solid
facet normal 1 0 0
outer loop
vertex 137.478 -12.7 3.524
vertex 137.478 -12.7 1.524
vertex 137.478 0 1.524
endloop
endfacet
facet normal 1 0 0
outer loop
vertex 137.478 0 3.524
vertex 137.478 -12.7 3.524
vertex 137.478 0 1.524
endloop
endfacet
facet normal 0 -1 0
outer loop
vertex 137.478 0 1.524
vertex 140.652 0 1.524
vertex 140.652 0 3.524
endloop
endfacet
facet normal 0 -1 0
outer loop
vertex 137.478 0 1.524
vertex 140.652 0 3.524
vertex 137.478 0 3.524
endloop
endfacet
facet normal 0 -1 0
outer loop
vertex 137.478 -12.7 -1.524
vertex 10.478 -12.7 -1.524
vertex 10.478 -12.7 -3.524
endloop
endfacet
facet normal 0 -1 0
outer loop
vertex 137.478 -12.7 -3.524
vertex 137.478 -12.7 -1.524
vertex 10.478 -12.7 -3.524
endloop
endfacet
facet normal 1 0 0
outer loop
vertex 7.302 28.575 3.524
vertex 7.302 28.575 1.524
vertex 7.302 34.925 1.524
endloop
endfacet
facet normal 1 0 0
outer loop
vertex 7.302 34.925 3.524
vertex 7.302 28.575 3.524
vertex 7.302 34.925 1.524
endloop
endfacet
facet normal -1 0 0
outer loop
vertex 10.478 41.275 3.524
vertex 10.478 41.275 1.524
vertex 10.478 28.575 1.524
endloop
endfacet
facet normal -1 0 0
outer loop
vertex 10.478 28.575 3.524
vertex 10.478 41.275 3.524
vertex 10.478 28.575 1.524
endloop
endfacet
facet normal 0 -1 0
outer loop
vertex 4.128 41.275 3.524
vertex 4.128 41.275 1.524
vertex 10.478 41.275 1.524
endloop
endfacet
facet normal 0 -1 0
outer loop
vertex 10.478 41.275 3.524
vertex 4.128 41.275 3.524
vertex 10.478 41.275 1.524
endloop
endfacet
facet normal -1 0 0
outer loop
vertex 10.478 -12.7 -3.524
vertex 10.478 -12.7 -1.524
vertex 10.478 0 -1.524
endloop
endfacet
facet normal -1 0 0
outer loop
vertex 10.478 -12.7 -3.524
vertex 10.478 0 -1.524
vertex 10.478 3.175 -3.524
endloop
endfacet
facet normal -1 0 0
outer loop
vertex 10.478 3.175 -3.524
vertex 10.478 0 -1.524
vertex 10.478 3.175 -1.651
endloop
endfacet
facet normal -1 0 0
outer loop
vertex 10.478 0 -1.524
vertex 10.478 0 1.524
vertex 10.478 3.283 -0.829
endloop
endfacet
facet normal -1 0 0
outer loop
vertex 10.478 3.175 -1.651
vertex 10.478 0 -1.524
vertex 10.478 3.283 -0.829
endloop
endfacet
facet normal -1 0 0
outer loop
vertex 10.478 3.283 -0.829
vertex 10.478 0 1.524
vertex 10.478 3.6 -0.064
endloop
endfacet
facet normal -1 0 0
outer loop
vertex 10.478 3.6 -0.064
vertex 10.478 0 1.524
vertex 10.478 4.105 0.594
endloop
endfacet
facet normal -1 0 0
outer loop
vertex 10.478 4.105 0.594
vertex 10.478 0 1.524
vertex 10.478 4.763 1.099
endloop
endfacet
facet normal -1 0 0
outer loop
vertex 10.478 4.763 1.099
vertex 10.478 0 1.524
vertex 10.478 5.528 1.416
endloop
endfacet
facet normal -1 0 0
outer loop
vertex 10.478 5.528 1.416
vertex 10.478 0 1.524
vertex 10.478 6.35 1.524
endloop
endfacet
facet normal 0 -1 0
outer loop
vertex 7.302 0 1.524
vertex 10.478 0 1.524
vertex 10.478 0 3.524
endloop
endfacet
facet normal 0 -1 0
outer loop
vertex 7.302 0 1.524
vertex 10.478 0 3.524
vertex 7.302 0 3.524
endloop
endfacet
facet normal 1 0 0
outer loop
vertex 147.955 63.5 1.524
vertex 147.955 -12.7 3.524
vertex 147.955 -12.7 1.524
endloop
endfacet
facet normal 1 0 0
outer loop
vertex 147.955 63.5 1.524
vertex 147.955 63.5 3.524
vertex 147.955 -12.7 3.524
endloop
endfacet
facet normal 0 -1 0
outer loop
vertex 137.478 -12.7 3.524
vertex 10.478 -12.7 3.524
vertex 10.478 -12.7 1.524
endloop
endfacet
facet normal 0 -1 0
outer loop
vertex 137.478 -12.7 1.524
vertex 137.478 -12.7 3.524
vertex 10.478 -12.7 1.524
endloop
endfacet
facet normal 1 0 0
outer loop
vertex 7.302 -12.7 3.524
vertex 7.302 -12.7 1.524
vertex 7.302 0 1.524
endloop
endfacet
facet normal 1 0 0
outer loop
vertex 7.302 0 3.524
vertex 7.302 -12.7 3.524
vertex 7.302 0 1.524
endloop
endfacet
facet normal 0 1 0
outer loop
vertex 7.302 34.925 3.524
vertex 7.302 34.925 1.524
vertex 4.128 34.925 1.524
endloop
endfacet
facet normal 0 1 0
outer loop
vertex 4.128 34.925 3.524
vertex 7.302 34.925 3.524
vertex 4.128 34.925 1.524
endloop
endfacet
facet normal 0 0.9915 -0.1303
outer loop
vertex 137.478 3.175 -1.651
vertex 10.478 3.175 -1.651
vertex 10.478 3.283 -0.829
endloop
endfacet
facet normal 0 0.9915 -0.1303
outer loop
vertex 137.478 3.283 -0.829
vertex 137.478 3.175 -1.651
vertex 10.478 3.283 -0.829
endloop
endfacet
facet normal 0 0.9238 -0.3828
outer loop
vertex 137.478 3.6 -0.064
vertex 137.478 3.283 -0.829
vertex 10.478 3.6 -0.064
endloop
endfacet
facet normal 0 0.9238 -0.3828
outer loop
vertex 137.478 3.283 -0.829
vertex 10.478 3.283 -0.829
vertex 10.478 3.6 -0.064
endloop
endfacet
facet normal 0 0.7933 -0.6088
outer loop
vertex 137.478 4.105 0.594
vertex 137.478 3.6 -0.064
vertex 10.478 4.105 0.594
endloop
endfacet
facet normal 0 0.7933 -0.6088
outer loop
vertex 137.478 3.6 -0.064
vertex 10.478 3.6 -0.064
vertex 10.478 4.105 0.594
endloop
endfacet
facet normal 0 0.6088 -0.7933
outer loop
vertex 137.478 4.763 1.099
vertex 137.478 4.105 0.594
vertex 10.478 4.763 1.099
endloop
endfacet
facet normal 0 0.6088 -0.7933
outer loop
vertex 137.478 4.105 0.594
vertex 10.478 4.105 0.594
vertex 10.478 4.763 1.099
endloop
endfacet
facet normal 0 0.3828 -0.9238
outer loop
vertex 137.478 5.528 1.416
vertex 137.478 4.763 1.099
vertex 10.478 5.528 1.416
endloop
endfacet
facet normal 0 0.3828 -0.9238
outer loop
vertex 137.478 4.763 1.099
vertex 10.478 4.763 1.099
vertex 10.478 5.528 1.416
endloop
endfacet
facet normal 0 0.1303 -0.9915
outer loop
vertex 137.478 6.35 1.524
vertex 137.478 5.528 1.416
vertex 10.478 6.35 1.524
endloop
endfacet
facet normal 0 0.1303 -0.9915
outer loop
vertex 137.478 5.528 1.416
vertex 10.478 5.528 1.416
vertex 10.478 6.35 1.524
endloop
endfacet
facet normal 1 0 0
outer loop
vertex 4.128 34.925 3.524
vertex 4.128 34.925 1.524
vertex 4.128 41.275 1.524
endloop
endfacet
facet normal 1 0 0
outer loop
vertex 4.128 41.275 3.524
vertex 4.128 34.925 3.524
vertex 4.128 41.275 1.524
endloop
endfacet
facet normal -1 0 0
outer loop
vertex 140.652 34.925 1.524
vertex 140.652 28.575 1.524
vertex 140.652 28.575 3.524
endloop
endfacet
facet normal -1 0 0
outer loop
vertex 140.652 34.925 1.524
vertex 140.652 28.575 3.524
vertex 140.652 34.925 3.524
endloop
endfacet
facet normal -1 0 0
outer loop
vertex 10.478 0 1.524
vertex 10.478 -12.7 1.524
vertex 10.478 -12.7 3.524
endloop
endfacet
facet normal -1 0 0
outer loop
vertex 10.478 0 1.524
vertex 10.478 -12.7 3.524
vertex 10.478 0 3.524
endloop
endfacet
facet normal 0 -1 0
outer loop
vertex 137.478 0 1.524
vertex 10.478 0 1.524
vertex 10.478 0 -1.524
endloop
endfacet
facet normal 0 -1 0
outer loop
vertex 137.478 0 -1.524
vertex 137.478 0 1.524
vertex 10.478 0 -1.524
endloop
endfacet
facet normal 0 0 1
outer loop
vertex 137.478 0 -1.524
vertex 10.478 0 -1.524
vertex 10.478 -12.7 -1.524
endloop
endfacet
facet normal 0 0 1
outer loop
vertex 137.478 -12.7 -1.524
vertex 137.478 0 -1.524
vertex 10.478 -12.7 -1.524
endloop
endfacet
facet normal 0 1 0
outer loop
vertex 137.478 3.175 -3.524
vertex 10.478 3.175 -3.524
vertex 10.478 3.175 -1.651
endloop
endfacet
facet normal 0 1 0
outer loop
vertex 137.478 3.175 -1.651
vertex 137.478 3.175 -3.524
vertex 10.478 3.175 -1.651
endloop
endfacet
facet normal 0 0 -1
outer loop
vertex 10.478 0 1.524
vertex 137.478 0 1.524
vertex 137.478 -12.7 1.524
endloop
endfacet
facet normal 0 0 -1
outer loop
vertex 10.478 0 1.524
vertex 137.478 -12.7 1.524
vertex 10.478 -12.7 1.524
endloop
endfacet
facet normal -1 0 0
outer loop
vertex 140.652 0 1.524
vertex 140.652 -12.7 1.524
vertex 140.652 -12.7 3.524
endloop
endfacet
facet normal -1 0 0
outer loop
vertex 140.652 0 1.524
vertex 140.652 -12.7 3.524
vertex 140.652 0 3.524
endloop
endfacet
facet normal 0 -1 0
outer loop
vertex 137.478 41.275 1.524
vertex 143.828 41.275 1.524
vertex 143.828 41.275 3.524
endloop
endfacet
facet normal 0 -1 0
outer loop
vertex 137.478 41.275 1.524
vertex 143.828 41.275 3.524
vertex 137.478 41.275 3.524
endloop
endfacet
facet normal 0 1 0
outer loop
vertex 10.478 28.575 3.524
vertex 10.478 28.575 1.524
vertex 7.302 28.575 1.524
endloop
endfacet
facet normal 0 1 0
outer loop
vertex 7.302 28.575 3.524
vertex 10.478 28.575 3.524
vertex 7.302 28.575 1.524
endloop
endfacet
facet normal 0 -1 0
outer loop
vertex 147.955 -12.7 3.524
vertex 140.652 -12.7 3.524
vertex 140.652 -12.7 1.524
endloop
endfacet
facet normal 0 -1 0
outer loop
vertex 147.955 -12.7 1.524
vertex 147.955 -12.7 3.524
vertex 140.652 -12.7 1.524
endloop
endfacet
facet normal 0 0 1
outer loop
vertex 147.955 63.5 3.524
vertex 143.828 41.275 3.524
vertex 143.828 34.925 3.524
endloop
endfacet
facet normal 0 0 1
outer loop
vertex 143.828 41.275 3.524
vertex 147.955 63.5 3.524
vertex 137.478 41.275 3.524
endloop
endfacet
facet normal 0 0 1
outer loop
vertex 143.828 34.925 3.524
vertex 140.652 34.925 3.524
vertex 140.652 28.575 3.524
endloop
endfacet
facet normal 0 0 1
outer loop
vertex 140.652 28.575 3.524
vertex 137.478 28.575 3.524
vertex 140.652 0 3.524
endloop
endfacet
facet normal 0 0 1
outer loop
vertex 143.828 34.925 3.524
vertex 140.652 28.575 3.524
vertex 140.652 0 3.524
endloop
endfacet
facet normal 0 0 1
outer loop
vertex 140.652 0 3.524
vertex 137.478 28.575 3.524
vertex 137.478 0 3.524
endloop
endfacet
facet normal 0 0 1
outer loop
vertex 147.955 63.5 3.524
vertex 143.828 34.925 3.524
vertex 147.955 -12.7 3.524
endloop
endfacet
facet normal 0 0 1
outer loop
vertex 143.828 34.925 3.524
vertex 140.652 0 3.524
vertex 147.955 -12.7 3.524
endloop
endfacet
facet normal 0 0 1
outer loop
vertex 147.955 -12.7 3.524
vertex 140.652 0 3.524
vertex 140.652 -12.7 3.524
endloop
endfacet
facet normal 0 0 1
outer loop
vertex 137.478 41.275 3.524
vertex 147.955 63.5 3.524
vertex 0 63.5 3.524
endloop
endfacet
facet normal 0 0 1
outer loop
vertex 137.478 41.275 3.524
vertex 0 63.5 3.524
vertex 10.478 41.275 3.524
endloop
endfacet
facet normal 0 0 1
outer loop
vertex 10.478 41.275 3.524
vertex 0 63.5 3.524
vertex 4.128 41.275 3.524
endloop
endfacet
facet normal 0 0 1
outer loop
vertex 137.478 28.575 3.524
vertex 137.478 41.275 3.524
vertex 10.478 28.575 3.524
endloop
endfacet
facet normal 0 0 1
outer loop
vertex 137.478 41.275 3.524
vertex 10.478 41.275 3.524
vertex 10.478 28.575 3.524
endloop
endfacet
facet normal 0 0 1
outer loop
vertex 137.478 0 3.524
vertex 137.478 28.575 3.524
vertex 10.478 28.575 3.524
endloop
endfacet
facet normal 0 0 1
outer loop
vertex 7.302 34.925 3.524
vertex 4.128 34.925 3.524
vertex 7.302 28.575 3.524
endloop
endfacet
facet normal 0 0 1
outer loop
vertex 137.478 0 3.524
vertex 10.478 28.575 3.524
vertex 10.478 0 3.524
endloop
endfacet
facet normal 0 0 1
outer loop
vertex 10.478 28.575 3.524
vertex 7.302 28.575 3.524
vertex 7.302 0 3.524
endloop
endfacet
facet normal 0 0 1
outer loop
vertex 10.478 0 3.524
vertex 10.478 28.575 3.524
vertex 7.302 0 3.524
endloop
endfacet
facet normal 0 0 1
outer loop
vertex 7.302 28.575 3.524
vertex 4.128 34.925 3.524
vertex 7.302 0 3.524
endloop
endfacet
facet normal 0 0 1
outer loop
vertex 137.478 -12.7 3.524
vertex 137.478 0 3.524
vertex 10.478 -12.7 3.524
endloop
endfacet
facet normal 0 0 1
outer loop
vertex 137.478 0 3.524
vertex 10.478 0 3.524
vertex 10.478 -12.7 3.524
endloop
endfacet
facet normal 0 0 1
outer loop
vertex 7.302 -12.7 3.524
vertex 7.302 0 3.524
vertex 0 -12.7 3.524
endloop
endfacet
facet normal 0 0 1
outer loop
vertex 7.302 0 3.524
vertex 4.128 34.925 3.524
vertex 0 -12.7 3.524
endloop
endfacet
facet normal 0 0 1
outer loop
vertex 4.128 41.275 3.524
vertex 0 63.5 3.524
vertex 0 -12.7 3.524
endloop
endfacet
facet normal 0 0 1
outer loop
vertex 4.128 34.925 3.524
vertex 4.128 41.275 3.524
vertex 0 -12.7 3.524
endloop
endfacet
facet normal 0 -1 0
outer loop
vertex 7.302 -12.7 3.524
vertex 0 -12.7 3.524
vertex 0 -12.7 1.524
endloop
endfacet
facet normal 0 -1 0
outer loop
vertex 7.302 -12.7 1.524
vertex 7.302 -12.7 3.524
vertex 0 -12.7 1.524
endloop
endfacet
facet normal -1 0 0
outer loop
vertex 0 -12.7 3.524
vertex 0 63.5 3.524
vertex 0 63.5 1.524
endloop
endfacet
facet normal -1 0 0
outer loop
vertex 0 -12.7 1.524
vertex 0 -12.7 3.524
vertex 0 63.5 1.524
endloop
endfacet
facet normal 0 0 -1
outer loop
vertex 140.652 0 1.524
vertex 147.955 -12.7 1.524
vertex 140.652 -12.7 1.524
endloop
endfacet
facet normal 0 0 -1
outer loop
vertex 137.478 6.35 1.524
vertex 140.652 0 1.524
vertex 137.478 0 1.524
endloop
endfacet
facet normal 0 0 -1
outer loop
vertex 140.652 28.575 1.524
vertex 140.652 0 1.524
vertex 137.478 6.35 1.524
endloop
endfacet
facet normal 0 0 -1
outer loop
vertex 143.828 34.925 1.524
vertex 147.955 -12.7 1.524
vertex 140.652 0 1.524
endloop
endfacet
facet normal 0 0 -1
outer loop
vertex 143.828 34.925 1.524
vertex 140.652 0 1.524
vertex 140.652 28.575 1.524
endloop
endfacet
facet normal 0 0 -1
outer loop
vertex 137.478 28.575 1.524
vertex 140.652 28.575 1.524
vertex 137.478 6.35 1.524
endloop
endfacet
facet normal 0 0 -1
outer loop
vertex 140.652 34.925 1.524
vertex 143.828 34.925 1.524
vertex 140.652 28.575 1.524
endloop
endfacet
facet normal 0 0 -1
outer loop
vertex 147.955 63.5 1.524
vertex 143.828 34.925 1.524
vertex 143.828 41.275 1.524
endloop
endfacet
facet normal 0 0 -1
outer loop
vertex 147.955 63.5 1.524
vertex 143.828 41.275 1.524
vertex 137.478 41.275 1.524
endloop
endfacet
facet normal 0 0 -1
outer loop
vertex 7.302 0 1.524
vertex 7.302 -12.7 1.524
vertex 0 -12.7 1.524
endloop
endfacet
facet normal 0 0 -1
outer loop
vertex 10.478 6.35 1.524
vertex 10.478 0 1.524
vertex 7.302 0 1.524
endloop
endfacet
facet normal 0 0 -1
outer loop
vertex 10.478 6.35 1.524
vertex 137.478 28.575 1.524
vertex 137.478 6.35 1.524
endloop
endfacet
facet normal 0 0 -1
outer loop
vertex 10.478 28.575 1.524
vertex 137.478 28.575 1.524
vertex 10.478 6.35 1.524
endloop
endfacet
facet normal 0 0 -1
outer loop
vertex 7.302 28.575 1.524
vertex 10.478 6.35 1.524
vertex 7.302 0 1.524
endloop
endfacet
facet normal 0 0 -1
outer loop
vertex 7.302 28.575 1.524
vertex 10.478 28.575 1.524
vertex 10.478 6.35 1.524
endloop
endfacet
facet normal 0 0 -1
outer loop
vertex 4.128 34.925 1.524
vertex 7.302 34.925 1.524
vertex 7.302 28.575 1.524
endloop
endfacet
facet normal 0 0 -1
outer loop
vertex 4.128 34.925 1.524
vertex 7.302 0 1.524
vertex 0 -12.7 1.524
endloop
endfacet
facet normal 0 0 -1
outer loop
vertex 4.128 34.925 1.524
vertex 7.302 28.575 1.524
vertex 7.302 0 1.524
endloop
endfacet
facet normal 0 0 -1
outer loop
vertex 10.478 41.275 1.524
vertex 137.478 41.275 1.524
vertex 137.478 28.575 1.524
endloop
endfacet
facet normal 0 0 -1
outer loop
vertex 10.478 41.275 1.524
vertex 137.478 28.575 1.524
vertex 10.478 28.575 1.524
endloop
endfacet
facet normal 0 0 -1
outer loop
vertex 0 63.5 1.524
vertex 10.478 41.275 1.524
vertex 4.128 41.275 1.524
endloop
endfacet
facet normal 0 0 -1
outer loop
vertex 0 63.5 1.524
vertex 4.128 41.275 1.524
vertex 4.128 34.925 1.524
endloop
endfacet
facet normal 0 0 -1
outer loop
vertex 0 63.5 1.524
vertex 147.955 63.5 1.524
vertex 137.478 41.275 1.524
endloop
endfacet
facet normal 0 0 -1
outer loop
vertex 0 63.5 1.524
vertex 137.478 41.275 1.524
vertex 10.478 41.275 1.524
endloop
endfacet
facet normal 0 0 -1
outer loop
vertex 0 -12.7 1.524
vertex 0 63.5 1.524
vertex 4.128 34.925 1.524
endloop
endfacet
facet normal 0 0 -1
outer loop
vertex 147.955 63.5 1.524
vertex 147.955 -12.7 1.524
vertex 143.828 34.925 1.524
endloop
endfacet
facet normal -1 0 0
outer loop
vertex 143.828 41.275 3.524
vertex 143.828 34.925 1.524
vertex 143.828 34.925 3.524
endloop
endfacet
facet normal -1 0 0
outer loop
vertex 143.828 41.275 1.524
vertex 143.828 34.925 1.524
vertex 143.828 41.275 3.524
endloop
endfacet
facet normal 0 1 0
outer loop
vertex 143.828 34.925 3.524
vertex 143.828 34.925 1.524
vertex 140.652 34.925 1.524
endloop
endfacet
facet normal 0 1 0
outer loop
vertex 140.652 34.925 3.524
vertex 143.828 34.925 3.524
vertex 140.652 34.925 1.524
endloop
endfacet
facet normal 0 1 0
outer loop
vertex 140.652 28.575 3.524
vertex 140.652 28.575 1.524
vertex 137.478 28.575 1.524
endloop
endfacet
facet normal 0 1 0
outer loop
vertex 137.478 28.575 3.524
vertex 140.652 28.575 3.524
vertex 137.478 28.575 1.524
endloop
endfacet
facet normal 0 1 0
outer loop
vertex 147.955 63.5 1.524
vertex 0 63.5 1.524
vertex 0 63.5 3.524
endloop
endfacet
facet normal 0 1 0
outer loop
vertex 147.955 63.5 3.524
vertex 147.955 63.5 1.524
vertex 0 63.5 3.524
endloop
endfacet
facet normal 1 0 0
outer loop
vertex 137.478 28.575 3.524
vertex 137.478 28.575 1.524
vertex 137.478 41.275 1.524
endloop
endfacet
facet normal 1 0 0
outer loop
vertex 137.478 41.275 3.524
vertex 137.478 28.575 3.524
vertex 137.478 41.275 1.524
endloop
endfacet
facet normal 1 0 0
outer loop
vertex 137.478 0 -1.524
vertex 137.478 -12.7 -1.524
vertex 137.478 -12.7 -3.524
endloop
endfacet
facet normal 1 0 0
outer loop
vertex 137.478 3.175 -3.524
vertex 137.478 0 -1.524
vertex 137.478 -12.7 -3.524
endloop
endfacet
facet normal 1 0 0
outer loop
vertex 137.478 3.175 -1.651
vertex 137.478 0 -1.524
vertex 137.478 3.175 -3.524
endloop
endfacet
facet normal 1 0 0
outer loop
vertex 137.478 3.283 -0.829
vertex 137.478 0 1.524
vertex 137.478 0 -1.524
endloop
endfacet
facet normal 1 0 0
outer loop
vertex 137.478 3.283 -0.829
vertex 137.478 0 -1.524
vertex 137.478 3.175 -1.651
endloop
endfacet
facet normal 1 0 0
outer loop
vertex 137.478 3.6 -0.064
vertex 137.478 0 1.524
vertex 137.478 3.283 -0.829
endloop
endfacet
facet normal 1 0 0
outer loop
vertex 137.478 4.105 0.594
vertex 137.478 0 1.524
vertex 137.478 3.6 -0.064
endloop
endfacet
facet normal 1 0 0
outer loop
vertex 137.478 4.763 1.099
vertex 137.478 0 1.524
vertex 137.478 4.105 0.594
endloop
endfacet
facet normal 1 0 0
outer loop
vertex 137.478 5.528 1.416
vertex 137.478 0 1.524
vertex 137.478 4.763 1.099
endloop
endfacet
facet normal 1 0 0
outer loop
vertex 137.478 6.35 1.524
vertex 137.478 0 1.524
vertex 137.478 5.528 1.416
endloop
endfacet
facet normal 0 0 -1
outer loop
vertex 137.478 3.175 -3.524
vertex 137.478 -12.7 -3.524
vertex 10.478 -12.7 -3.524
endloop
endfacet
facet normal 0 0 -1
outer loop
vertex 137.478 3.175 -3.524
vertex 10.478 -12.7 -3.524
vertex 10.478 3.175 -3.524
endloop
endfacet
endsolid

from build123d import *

# Parameters (mm, degrees)
BOSS_EXTRUDE1_DEPTH = 147.955
SKETCH2_W           = 10.4775
SKETCH2_H           = 19.05
CUT_EXTRUDE1_DEPTH  = 162.085115169
SKETCH3_W           = 3.175
SKETCH3_H           = 12.7
CUT_EXTRUDE2_DEPTH  = 162.085115169
SKETCH4_W           = 6.35
SKETCH4_H           = 6.35
SKETCH4_W_2         = 3.175
CUT_EXTRUDE3_DEPTH  = 162.085115169


with BuildPart() as part:
    # Sketch1 → Boss-Extrude1 (new body)
    with BuildSketch(Plane(origin=(0, 0, 0), x_dir=(0, 0, -1), z_dir=(1, 0, 0))):
        with BuildLine():
            Line((1.524, 0), (1.524, -12.7))
            Line((1.524, -12.7), (3.524, -12.7))
            Line((3.524, -12.7), (3.524, 3.175))
            Line((3.524, 3.175), (1.651, 3.175))
            ThreePointArc((1.651, 3.175), (-0.59406403, 4.10493597), (-1.524, 6.35))
            Line((-1.524, 6.35), (-1.524, 63.5))
            Line((-1.524, 63.5), (-3.524, 63.5))
            Line((-3.524, 63.5), (-3.524, -12.7))
            Line((-3.524, -12.7), (-1.524, -12.7))
            Line((-1.524, -12.7), (-1.524, 0))
            Line((-1.524, 0), (1.524, 0))
        make_face()
    extrude(amount=BOSS_EXTRUDE1_DEPTH)

    # Sketch2 → Cut-Extrude1 (cut, through all)
    with BuildSketch(Plane(origin=(0, 0, 1.524), x_dir=(-1, 0, 0), z_dir=(0, 0, -1))):
        with Locations((-142.71625, -3.175)):
            Rectangle(SKETCH2_W, SKETCH2_H)
        with Locations((-5.23875, -3.175)):
            Rectangle(SKETCH2_W, SKETCH2_H)
    extrude(amount=CUT_EXTRUDE1_DEPTH, mode=Mode.SUBTRACT)

    # Sketch3 → Cut-Extrude2 (cut, through all)
    with BuildSketch(Plane(origin=(0, 0, 1.524), x_dir=(-1, 0, 0), z_dir=(0, 0, -1))):
        with Locations((-139.065, -6.35)):
            Rectangle(SKETCH3_W, SKETCH3_H)
        with Locations((-8.89, -6.35)):
            Rectangle(SKETCH3_W, SKETCH3_H)
    extrude(amount=-CUT_EXTRUDE2_DEPTH, mode=Mode.SUBTRACT)

    # Sketch4 → Cut-Extrude3 (cut, through all)
    with BuildSketch(Plane(origin=(0, 0, 1.524), x_dir=(-1, 0, 0), z_dir=(0, 0, -1))):
        with Locations((-140.6525, 38.1)):
            Rectangle(SKETCH4_W, SKETCH4_H)
        with Locations((-139.065, 31.75)):
            Rectangle(SKETCH4_W_2, SKETCH4_H)
        Polygon((-10.4775, 41.275), (-10.4775, 34.925), (-7.3025, 34.925), (-4.1275, 34.925), (-4.1275, 41.275), align=None)
        with Locations((-8.89, 31.75)):
            Rectangle(SKETCH4_W_2, SKETCH4_H)
    extrude(amount=-CUT_EXTRUDE3_DEPTH, mode=Mode.SUBTRACT)


solid = part.part
